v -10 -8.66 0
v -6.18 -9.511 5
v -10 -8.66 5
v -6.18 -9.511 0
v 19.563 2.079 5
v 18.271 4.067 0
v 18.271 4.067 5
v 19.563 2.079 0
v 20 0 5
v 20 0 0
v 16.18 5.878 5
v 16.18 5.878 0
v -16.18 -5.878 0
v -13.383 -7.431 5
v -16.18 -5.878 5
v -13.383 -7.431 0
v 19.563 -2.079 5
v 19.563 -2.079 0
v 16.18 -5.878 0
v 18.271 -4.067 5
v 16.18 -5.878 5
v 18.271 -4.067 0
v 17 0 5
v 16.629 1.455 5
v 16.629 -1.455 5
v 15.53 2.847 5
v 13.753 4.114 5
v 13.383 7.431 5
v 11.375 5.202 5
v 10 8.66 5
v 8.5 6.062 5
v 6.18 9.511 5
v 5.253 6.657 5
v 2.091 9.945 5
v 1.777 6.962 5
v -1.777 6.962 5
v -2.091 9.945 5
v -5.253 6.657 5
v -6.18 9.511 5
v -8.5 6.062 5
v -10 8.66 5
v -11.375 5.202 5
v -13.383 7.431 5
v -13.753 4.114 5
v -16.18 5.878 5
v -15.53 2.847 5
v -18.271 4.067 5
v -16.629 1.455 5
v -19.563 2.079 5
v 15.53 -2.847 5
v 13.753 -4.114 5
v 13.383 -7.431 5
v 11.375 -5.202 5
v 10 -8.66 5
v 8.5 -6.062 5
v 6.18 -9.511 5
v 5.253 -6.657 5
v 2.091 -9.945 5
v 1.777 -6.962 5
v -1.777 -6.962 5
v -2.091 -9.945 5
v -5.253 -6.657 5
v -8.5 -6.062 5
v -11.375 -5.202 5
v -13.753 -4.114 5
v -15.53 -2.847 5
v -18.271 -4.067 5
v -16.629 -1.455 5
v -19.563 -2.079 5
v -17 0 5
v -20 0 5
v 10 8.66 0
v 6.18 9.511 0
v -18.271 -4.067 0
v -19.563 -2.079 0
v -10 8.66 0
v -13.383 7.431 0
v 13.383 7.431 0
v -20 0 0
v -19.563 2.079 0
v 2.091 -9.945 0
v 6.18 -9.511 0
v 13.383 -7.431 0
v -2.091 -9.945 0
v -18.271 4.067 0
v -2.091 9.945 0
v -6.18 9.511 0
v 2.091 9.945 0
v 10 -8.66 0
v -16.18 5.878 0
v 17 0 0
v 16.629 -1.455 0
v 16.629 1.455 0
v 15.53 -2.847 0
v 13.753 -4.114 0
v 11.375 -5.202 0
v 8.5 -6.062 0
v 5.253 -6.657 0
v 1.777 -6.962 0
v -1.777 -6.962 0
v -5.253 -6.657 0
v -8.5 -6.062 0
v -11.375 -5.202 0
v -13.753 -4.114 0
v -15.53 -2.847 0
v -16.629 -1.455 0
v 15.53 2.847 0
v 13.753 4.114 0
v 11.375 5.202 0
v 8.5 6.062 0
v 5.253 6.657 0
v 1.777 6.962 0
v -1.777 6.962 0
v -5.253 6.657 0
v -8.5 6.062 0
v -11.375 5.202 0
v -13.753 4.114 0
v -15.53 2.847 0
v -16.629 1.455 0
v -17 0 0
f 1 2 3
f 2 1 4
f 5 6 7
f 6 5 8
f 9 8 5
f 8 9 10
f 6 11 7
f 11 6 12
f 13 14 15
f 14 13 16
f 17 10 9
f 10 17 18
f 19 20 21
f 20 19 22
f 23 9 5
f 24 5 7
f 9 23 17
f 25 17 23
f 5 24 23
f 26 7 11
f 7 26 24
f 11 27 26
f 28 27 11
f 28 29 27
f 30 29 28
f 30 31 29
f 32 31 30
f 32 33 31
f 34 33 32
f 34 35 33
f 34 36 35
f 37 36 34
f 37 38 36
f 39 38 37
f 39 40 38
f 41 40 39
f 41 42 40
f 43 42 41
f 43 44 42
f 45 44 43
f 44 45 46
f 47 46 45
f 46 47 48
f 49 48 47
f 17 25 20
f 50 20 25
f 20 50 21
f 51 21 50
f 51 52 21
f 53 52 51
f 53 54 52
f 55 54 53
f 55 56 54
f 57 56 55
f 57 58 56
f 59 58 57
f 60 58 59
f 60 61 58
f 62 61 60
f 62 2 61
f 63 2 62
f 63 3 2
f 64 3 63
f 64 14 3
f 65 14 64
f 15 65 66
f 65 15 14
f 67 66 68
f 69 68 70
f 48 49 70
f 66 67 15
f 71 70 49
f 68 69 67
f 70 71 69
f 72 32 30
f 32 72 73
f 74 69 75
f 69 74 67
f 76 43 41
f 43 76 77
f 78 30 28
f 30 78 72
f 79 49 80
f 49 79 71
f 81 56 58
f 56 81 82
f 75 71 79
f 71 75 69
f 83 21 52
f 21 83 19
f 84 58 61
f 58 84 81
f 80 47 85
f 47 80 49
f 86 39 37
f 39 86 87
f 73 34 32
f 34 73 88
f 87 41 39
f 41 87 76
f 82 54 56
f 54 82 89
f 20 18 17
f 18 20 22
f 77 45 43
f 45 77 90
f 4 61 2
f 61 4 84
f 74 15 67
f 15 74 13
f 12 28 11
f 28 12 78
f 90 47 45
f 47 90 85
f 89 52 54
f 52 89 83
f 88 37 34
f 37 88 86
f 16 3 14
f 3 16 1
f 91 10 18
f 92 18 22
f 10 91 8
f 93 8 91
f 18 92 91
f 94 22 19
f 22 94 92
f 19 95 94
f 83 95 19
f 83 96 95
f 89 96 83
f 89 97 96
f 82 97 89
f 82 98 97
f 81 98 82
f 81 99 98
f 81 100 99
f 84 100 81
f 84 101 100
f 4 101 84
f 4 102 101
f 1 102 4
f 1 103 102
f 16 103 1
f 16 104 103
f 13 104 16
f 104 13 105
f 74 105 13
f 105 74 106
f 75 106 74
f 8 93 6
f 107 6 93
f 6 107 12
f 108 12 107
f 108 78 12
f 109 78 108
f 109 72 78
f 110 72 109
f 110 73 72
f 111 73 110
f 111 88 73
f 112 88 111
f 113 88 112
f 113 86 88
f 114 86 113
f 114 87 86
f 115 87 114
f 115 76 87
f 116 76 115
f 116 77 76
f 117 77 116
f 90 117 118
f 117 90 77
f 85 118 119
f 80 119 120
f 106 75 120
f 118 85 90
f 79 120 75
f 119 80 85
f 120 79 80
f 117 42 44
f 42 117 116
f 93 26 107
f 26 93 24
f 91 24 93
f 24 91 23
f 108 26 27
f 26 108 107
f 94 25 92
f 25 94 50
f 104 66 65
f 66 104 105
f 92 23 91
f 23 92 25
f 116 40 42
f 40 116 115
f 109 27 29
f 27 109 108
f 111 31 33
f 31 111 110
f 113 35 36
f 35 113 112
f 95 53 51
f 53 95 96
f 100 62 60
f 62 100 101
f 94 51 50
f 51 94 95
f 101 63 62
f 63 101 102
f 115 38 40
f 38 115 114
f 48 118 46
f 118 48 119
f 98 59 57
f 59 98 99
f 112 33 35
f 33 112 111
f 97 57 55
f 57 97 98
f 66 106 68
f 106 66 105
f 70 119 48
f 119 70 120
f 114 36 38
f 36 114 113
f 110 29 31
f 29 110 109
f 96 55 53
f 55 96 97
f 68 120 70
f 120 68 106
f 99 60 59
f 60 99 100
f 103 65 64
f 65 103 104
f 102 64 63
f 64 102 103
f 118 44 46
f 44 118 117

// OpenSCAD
// file: ../../open-oval.scad
//use <libraries/MCAD/shapes.scad>
use </usr/share/openscad/libraries/MCAD/shapes.scad>

module openOval()
{
	echo("before");
	openOval2d();
	echo("after");
}

/** Support functions and modules follow.  **/

module openOval2d(width = 20,
				  height = 10,
				  depth = 5,
				  borderThickness = 3)
{
	echo("before elipse");

	difference()
	{
		ellipticalCylinder(w = width, h = height, height = depth);

		w = width - borderThickness;
		h = height - borderThickness;
		translate([0, 0, -0.01])
		ellipticalCylinder(w = w, h = h, height = depth + 0.02);
	}

	echo("after elipse");
}
// main file
use <../../open-oval.scad>

openOval();

echo("end of run");
